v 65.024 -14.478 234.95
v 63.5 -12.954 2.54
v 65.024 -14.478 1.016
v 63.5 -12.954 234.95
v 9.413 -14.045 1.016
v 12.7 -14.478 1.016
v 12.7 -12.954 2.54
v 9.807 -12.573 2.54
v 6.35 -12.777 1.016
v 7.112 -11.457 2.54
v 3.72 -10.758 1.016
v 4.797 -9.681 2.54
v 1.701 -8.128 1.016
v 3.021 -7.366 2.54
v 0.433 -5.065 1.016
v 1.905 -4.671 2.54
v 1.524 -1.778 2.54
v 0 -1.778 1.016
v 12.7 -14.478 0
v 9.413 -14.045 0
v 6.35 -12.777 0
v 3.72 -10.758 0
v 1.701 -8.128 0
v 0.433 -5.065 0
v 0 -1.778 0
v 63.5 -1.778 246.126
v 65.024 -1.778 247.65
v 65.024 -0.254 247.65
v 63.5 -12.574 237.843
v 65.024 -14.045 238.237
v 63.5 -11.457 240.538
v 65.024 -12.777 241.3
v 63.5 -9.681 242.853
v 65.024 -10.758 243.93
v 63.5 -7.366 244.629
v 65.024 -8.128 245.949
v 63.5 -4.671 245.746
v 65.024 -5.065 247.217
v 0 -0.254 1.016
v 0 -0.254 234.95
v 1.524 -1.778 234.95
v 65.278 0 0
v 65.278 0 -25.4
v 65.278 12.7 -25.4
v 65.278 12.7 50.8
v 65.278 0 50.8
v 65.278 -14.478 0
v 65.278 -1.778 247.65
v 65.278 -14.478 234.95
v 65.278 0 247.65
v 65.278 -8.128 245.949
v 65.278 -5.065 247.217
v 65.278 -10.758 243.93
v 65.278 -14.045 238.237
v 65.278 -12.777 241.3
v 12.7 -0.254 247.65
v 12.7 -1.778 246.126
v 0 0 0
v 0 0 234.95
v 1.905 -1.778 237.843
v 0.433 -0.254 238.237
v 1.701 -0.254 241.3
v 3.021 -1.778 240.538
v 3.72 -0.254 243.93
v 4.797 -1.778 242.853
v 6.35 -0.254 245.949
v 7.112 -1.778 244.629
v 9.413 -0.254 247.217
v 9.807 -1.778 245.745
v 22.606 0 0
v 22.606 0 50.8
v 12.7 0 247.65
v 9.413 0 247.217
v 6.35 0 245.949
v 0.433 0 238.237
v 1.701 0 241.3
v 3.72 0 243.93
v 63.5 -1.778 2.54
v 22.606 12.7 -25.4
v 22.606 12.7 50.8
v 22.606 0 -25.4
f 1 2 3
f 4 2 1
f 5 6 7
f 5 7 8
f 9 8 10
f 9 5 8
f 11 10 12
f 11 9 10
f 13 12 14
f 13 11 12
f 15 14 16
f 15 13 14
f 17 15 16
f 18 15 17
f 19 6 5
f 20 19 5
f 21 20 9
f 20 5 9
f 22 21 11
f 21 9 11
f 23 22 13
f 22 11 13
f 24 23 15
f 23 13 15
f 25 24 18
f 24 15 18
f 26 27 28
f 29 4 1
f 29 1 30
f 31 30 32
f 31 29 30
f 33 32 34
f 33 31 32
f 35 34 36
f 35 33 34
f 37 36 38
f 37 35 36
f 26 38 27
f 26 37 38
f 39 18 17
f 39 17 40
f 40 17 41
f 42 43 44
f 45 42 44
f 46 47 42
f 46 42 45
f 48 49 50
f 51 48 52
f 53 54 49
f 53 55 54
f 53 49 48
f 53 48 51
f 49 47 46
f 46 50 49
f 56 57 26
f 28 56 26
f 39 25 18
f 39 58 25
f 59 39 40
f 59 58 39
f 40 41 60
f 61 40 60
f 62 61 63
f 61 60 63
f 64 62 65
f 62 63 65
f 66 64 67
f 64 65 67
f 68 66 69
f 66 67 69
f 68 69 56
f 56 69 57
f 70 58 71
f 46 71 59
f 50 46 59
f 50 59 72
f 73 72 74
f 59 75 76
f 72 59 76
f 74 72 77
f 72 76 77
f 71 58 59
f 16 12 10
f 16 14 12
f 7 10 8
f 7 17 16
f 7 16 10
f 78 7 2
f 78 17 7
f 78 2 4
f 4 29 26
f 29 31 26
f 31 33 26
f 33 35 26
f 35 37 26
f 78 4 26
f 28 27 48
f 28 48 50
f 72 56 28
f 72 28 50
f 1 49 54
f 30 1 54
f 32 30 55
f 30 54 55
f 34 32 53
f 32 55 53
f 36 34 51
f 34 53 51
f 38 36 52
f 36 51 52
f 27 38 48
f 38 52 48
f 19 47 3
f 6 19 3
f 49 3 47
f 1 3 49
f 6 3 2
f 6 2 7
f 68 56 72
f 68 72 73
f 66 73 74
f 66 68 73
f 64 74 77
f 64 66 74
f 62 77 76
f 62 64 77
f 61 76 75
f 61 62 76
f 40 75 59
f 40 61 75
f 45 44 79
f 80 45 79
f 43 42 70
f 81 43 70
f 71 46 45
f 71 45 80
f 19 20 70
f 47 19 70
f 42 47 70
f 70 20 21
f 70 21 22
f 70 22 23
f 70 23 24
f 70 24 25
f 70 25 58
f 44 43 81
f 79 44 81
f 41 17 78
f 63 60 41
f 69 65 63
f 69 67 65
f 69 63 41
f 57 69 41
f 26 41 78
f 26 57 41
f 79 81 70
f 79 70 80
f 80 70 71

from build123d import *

# Parameters (mm, degrees)
F0_W        = 63.5
F0_H        = 247.65
F1_DEPTH    = 1.778
F2_W        = 63.5
F2_H        = 2.54
F3_DEPTH    = 12.7
F4_W        = 14.478
F4_H        = 247.65
F5_DEPTH    = 1.778
F6_W        = 42.672
F6_H        = 76.2
F7_DEPTH    = 12.7
F8_R        = 12.7
F9_R        = 12.7
F10_C1_SIZE = 1.524
F10_C2_SIZE = 1.524
F10_C3_SIZE = 1.5236


# Not quite as in the source:
# - a fillet or chamfer is up to 0.001 mm smaller than in the source, because OpenCascade refuses the exact size


with BuildPart() as f1:
    # F0 (on Front) → F1 (new body)
    with BuildSketch(Plane.XZ):
        with Locations((31.75, 123.825)):
            Rectangle(F0_W, F0_H)
    extrude(amount=F1_DEPTH)

    # F2 (on face) → F3 (join)
    with BuildSketch(Plane.XZ.offset(1.778)):
        with Locations((31.75, 1.27)):
            Rectangle(F2_W, F2_H)
    extrude(amount=F3_DEPTH)

    # F4 (on face) → F5 (join)
    with BuildSketch(Plane.YZ.offset(63.5)):
        with Locations((-7.239, 123.825)):
            Rectangle(F4_W, F4_H)
    extrude(amount=F5_DEPTH)

    # F6 (on face) → F7 (join)
    with BuildSketch(Plane(origin=(0, 0, 0), x_dir=(-1, 0, 0), z_dir=(0, 1, 0))):
        with Locations((-43.942, 12.7)):
            Rectangle(F6_W, F6_H)
    extrude(amount=F7_DEPTH)

    # F8
    f8_edges = [f1.edges().sort_by_distance(p)[0] for p in [
        (0, -0.889, 247.65),
        (64.389, -14.478, 247.65),
    ]]
    fillet(f8_edges, radius=F8_R)

    # F9
    f9_edges = [f1.edges().sort_by_distance(p)[0] for p in [
        (0, -14.478, 1.27),
    ]]
    fillet(f9_edges, radius=F9_R)

    # F10: chamfer of 1.524 on 3 edges, made by hand

    # F10_c1
    f10_c1_edges = [f1.edges().sort_by_distance(p)[0] for p in [
        (0, -1.778, 118.745),
        (3.7197438789, -1.778, 243.9302561211),
        (38.1, -1.778, 247.65),
    ]]
    chamfer(f10_c1_edges, length=F10_C1_SIZE)

    # F10_c2
    f10_c2_edges = [f1.edges().sort_by_distance(p)[0] for p in [
        (3.7197438789, -10.7582561211, 2.54),
        (38.1, -14.478, 2.54),
    ]]
    chamfer(f10_c2_edges, length=F10_C2_SIZE)

    # F10_c3 (size 1.524 in the source; OpenCascade refuses exactly that, so slightly less here)
    f10_c3_edges = [f1.edges().sort_by_distance(p)[0] for p in [
        (63.5, -14.478, 118.745),
        (63.5, -10.7582561211, 243.9302561211),
    ]]
    chamfer(f10_c3_edges, length=F10_C3_SIZE)


solid = f1.part
